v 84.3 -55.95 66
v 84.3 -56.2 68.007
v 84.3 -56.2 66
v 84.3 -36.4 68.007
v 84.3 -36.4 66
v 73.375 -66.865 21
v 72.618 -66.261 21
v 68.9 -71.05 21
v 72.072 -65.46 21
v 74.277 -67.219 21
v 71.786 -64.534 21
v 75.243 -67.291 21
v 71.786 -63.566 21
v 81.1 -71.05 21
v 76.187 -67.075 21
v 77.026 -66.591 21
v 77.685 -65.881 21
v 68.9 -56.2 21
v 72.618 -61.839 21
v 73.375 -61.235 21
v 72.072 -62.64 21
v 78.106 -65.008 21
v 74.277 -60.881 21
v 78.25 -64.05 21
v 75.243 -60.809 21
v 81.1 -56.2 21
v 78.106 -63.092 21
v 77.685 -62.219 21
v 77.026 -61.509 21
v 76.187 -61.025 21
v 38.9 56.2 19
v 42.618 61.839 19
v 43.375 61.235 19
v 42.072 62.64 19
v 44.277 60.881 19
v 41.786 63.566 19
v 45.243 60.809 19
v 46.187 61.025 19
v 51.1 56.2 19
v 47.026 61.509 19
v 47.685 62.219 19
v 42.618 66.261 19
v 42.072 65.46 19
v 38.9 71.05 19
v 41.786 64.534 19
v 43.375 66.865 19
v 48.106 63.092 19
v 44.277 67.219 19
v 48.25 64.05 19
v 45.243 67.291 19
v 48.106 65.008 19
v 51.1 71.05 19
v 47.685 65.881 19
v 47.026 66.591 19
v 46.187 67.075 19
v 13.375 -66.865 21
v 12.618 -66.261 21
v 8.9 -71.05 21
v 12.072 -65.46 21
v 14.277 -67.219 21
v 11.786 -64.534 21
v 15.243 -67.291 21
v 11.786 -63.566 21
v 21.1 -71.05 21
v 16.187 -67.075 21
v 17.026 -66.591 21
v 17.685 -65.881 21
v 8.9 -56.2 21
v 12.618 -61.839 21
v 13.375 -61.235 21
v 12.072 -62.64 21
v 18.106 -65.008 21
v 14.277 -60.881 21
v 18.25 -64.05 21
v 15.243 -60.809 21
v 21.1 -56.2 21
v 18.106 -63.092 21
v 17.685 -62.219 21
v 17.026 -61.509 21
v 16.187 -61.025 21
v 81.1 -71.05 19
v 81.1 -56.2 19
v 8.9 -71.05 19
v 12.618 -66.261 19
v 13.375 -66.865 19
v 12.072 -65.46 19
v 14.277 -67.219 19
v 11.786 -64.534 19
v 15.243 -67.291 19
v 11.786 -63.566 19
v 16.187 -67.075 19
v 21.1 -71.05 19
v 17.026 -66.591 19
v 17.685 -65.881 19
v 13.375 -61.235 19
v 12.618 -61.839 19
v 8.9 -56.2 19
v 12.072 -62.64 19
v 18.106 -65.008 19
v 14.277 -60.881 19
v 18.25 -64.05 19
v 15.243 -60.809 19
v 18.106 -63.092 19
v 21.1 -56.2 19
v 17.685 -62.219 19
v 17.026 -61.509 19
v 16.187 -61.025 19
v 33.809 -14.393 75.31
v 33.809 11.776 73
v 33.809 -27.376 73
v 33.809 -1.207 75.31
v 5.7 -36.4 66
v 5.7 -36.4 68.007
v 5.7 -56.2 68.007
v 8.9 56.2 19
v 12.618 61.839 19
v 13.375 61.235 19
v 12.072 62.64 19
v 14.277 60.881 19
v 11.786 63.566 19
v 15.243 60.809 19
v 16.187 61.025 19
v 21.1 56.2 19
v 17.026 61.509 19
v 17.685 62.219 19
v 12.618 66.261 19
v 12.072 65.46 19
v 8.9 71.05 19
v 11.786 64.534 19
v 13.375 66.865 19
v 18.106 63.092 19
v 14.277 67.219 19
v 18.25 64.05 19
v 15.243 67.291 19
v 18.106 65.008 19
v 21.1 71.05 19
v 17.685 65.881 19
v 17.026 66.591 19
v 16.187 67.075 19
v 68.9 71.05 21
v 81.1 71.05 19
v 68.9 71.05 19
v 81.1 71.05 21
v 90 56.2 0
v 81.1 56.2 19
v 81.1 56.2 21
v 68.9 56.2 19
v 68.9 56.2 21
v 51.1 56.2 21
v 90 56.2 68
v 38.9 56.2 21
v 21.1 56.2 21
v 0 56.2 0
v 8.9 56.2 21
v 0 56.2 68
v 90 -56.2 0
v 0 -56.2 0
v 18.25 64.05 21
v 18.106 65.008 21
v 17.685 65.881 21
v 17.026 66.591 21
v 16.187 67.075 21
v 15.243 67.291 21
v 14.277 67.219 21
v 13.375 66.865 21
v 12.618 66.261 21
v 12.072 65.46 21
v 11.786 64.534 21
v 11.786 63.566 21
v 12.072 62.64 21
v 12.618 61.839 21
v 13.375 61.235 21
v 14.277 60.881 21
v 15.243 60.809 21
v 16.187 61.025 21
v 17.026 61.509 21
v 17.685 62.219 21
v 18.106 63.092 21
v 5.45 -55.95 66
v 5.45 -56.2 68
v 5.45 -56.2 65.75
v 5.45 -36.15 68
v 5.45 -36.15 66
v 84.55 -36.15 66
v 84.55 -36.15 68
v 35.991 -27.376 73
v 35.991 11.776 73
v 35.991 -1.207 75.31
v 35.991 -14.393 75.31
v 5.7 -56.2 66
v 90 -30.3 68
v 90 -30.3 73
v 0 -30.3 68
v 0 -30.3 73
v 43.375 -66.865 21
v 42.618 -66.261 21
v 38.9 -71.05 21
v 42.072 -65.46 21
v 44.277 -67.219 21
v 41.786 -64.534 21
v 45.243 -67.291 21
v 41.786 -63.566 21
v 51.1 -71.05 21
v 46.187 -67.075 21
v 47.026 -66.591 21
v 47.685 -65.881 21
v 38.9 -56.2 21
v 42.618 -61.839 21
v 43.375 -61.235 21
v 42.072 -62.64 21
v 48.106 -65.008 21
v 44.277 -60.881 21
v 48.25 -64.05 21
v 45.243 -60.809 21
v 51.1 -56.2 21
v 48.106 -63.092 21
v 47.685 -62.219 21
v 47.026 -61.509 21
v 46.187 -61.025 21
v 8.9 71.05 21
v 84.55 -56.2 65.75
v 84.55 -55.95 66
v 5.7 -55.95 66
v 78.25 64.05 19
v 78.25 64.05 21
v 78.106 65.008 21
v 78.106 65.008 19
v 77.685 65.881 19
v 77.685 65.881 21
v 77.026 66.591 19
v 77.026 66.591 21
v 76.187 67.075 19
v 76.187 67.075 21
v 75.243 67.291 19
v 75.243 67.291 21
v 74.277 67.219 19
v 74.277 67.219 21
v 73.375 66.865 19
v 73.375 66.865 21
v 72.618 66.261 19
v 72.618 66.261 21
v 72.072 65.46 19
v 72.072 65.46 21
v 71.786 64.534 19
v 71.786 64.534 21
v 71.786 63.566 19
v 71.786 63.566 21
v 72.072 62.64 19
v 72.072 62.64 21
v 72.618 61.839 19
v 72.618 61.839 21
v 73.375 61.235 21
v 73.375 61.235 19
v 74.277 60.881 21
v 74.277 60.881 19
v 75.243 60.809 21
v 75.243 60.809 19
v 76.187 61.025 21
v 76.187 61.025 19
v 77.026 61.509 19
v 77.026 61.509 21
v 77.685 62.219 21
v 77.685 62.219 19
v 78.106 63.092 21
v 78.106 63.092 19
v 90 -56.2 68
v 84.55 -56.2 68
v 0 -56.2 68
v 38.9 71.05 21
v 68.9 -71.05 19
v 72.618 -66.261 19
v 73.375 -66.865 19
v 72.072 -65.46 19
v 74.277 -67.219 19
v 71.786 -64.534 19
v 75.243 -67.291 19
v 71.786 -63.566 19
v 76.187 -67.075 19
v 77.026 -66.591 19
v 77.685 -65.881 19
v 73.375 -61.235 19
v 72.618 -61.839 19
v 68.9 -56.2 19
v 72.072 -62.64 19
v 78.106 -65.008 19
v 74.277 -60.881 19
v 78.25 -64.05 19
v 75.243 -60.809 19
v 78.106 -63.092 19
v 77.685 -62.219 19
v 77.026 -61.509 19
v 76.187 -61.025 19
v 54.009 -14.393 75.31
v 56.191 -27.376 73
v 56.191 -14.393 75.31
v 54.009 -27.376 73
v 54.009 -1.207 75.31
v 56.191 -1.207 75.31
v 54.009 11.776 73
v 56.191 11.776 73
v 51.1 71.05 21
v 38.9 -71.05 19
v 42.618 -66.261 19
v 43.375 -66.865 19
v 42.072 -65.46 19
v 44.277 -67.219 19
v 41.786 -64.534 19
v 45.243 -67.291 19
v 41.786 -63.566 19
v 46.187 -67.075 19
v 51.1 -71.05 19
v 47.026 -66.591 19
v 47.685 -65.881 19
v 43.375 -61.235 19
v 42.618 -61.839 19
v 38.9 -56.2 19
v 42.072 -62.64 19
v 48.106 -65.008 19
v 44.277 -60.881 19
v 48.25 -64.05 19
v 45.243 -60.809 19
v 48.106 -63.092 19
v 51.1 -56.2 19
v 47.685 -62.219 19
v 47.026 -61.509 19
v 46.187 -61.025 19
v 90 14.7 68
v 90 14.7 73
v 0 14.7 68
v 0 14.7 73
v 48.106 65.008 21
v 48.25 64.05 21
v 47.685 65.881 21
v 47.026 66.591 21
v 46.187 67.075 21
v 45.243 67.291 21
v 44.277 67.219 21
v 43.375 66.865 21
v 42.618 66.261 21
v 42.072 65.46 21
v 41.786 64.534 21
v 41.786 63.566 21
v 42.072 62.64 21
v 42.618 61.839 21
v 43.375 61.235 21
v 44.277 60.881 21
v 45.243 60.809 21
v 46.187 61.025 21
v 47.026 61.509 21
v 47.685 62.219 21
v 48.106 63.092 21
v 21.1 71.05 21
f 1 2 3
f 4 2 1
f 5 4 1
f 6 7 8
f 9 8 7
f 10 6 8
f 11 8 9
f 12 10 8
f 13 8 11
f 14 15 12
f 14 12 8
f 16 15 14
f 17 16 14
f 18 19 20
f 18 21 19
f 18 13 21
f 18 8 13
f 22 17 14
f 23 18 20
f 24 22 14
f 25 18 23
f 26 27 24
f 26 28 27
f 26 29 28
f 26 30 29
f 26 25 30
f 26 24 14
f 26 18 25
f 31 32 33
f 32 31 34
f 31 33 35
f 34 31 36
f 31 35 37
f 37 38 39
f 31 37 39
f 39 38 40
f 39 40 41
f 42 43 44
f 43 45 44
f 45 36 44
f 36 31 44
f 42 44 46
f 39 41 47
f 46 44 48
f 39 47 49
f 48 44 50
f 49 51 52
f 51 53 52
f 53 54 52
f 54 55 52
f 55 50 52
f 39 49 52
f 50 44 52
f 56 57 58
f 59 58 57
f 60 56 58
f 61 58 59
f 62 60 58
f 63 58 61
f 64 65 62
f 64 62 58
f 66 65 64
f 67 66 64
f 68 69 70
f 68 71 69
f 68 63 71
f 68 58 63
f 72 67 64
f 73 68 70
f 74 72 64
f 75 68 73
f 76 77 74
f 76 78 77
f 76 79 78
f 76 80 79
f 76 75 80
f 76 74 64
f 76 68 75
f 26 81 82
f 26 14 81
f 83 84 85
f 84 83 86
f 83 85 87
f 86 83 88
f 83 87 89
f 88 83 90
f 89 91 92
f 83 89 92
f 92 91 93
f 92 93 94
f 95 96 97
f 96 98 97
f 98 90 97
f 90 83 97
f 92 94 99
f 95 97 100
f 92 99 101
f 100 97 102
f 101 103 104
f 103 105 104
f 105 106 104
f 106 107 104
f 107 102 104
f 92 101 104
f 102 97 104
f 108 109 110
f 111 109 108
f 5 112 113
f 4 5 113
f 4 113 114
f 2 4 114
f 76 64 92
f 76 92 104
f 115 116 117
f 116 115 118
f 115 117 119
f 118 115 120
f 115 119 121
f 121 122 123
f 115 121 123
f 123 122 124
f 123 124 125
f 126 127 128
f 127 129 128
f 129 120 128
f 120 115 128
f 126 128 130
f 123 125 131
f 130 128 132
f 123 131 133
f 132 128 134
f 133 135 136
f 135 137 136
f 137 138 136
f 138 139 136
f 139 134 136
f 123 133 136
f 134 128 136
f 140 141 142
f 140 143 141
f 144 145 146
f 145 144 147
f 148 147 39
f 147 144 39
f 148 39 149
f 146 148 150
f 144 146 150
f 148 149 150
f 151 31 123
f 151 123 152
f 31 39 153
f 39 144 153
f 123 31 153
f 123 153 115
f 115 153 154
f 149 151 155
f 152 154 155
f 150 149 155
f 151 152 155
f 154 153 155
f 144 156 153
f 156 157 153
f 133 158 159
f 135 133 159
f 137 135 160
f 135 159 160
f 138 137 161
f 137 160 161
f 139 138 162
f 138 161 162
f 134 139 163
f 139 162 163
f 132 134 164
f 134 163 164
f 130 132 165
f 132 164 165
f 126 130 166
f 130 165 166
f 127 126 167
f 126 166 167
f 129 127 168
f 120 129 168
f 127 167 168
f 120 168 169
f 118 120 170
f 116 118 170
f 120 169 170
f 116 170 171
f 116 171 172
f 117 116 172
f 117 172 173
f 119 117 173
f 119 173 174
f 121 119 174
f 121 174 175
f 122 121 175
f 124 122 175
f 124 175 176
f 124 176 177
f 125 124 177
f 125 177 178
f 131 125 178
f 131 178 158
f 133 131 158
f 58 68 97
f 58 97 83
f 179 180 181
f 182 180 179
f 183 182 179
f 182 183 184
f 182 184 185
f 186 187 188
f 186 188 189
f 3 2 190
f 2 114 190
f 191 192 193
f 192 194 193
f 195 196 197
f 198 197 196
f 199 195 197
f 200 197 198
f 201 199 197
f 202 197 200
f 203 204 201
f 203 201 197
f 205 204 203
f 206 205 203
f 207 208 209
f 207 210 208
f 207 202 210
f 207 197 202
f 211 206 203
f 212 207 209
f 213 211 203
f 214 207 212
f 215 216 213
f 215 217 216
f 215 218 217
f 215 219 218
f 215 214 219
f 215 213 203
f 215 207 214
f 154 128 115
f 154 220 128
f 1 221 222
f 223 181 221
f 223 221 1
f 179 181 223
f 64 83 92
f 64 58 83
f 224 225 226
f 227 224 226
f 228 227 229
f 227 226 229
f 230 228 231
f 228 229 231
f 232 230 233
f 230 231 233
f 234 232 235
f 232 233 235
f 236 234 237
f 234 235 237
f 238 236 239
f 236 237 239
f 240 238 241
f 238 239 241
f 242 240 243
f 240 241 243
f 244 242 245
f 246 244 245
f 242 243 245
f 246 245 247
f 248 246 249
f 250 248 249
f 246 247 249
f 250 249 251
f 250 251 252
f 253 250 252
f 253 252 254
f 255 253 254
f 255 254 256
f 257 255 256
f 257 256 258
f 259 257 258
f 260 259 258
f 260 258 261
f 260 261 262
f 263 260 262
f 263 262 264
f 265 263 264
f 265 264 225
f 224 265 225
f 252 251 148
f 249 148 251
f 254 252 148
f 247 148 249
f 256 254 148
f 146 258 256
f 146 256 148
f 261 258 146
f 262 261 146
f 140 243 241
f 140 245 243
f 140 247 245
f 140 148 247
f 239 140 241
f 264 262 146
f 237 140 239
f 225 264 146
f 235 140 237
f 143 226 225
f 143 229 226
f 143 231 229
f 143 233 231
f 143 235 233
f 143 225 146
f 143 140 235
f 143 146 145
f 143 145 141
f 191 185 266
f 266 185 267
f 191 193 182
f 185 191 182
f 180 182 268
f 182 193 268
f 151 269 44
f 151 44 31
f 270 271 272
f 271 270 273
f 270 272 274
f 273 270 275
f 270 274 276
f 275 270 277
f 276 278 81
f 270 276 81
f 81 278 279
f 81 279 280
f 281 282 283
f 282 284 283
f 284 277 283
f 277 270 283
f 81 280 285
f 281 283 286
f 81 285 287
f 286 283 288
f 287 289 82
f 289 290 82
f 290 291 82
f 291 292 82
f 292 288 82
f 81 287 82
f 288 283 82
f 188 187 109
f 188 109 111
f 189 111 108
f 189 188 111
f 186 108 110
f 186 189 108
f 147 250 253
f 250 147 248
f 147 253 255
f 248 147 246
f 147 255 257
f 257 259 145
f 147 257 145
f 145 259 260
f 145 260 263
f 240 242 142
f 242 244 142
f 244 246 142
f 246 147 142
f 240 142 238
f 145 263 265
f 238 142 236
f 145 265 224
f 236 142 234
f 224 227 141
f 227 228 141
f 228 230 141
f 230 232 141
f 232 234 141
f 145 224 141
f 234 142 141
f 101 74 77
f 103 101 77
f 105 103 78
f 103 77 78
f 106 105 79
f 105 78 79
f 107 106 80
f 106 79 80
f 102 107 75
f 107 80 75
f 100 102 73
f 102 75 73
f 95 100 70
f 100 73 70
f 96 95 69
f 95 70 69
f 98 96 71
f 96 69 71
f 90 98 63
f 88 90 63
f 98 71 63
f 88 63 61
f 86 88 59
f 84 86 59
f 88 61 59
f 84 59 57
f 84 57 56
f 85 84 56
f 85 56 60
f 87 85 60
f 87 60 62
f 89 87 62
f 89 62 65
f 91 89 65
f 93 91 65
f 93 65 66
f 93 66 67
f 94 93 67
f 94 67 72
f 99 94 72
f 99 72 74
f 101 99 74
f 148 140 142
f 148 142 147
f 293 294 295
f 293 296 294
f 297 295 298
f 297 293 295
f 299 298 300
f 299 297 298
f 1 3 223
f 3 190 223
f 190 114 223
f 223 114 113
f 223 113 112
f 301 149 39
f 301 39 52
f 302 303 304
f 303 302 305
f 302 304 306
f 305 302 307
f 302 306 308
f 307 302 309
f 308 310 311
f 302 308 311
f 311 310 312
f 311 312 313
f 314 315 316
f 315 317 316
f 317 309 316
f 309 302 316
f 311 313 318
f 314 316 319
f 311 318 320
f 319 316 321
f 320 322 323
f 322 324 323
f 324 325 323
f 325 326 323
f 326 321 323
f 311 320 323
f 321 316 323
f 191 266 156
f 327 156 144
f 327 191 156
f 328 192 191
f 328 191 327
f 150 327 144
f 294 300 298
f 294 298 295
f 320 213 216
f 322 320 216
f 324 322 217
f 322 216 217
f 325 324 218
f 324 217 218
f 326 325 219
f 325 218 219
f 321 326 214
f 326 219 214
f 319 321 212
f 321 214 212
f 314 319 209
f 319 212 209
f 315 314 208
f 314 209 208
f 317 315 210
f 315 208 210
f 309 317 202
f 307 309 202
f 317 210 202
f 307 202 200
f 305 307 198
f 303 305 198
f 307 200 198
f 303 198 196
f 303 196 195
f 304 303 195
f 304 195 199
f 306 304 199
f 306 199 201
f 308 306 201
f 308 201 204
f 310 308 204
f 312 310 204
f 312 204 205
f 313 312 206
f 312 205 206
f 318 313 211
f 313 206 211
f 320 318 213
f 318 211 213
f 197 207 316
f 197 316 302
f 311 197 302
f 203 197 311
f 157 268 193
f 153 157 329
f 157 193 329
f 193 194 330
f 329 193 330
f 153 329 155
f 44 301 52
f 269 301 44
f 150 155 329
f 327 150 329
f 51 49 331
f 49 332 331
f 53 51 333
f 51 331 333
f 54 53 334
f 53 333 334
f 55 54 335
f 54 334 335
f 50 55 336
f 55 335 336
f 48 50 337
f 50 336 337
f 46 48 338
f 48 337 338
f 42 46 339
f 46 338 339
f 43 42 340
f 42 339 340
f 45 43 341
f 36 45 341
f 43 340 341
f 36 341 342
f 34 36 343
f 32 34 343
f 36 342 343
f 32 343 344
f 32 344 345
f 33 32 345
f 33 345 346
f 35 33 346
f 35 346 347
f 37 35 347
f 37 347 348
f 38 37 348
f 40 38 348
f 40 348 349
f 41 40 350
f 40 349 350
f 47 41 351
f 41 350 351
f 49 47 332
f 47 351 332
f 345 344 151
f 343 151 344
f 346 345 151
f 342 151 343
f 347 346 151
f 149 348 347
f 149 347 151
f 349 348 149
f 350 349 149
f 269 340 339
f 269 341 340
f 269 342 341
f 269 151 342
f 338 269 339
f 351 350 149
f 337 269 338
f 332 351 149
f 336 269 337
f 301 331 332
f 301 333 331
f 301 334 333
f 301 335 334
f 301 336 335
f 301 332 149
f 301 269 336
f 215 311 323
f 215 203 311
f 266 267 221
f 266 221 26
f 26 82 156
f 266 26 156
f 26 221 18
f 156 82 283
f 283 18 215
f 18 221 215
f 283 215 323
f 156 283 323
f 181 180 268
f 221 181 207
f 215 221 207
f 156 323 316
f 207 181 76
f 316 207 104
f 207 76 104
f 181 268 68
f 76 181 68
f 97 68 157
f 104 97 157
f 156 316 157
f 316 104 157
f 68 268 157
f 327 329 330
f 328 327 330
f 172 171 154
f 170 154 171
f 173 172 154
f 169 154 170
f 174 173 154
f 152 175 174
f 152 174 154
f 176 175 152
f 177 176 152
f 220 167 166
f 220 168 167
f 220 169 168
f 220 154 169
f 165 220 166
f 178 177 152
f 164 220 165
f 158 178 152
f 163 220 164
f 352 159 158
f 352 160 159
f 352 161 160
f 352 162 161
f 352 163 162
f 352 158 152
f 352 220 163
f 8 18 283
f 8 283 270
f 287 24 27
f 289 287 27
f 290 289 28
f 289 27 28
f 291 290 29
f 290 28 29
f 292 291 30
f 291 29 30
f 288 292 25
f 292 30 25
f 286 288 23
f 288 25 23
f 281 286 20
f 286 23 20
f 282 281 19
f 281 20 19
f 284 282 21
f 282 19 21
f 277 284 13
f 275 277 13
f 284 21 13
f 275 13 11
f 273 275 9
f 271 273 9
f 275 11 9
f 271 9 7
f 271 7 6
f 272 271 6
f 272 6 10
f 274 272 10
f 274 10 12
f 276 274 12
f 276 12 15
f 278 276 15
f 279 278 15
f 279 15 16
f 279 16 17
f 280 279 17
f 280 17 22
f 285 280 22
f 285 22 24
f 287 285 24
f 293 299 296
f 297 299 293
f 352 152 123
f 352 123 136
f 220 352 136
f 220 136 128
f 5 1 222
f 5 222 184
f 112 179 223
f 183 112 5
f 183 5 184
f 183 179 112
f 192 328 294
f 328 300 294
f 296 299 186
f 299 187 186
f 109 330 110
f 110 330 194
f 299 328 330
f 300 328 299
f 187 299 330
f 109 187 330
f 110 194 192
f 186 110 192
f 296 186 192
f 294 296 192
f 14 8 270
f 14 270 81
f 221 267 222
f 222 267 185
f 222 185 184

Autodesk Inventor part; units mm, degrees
sketch "Sketch_1" plane through (0, 0, 0) normal (1, 0, 0) x (0, 1, 0)
  line L0 (-30.3, 73) -> (-30.3, 68)
  line L1 (-30.3, 68) -> (-56.2, 68)
  line L2 (-56.2, 68) -> (-56.2, 0)
  line L3 (-56.2, 0) -> (56.2, 0)
  line L4 (56.2, 0) -> (56.2, 68)
  line L5 (56.2, 68) -> (14.7, 68)
  line L6 (14.7, 68) -> (14.7, 73)
  line L7 (14.7, 73) -> (-30.3, 73)
extrude "Extrusion1" add sketch "Sketch_1" along normal blind 90
sketch "Sketch_3" plane through (45, 0, 0) normal (1, 0, 0) x (0, 0, -1)
  line L0 (-69, -56.2) -> (-65.75, -56.2)
  line L1 (-65.75, -56.2) -> (-66, -55.95)
  line L2 (-66, -55.95) -> (-66, -36.15)
  line L3 (-66, -36.15) -> (-69, -36.15)
  line L4 (-69, -36.15) -> (-69, -56.2)
extrude "Extrusion2" cut sketch "Sketch_3" along normal mid plane 79.1
sketch "Sketch_2" plane through (45, 0, 0) normal (1, 0, 0) x (0, 0, -1)
  line L0 (-68.007, -56.2) -> (-66, -56.2)
  line L1 (-66, -56.2) -> (-66, -36.4)
  line L2 (-66, -36.4) -> (-68.007, -36.4)
  line L3 (-68.007, -36.4) -> (-68.007, -56.2)
extrude "Extrusion3" add sketch "Sketch_2" along normal mid plane 78.6
sketch "Sketch_4" plane through (35.991, 0, 0) normal (1, 0, 0) x (0, 0, -1)
  arc A0 (-73, 11.7765) -> (-73, -27.3765) centre (-0.6, -7.8) ccw
  line L0 (-73, -27.3765) -> (-73, 11.7765)
extrude "Extrusion4" add sketch "Sketch_4" against normal blind 2.182
sketch "Sketch_5" plane through (54.009, 0, 0) normal (1, 0, 0) x (0, 0, -1)
  arc A0 (-73, 11.7765) -> (-73, -27.3765) centre (-0.6, -7.8) ccw
  line L0 (-73, -27.3765) -> (-73, 11.7765)
extrude "Extrusion5" add sketch "Sketch_5" along normal blind 2.182
sketch "Sketch_7" plane through (0, 0, 21) normal (0, 0, 1) x (1, 0, 0)
  line L0 (8.9, -71.05) -> (21.1, -71.05)
  line L1 (21.1, -71.05) -> (21.1, -54.2)
  line L2 (21.1, -54.2) -> (38.9, -54.2)
  line L3 (38.9, -54.2) -> (38.9, -71.05)
  line L4 (38.9, -71.05) -> (51.1, -71.05)
  line L5 (51.1, -71.05) -> (51.1, -54.2)
  line L6 (51.1, -54.2) -> (68.9, -54.2)
  line L7 (68.9, -54.2) -> (68.9, -71.05)
  line L8 (68.9, -71.05) -> (81.1, -71.05)
  line L9 (81.1, -71.05) -> (81.1, 71.05)
  line L10 (81.1, 71.05) -> (68.9, 71.05)
  line L11 (68.9, 71.05) -> (68.9, 54.2)
  line L12 (68.9, 54.2) -> (51.1, 54.2)
  line L13 (51.1, 54.2) -> (51.1, 71.05)
  line L14 (51.1, 71.05) -> (38.9, 71.05)
  line L15 (38.9, 71.05) -> (38.9, 54.2)
  line L16 (38.9, 54.2) -> (21.1, 54.2)
  line L17 (21.1, 54.2) -> (21.1, 71.05)
  line L18 (21.1, 71.05) -> (8.9, 71.05)
  line L19 (8.9, 71.05) -> (8.9, -71.05)
  circle A0 centre (75, 64.05) radius 3.25
  circle A1 centre (75, -64.05) radius 3.25
  circle A2 centre (45, 64.05) radius 3.25
  circle A3 centre (45, -64.05) radius 3.25
  circle A4 centre (15, 64.05) radius 3.25
  circle A5 centre (15, -64.05) radius 3.25
extrude "Extrusion6" add sketch "Sketch_7" against normal blind 2
ref_plane "FOR_P2_XY" through (0, 56.2, 0) normal (0, 1, 0) x (1, 0, 0)
ref_plane "FOR_P2_YZ" through (0, 56.2, 0) normal (1, 0, 0) x (0, 0, -1)
ref_plane "FOR_P2_ZX" through (0, 56.2, 0) normal (0, 0, -1) x (0, 1, 0)
ref_plane "FOR_P22_XY" through (90, -56.2, 0) normal (0, -1, 0) x (1, 0, 0)
ref_plane "FOR_P22_YZ" through (90, -56.2, 0) normal (1, 0, 0) x (0, 0, 1)
ref_plane "FOR_P22_ZX" through (90, -56.2, 0) normal (0, 0, 1) x (0, -1, 0)
ref_plane "P1_XY" through (0, 0, 0) normal (0, 0, 1) x (1, 0, 0)
ref_plane "P1_YZ" through (0, 0, 0) normal (1, 0, 0) x (0, 1, 0)
ref_plane "P1_ZX" through (0, 0, 0) normal (0, 1, 0) x (0, 0, 1)
ref_plane "P3_XY" through (45, -5.518, 73) normal (0, 0, 1) x (1, 0, 0)
ref_plane "P3_YZ" through (45, -5.518, 73) normal (1, 0, 0) x (0, 1, 0)
ref_plane "P3_ZX" through (45, -5.518, 73) normal (0, 1, 0) x (0, 0, 1)
properties part number "nzm1_3p_p1"
